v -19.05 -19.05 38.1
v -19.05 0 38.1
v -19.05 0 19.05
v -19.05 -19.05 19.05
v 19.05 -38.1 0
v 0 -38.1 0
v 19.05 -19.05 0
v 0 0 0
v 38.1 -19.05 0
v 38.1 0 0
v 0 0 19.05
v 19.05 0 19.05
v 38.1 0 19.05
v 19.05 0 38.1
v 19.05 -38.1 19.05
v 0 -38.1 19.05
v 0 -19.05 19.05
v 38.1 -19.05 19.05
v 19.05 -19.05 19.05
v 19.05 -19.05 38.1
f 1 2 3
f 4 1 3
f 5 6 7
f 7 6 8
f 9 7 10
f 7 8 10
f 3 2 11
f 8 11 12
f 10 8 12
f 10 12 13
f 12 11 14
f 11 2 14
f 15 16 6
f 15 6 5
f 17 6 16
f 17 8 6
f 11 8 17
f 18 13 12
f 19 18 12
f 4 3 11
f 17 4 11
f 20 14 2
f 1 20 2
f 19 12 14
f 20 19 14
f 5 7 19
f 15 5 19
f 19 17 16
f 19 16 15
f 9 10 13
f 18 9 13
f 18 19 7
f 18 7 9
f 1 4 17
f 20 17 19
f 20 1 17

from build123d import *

# Parameters (mm, degrees)
F1_DEPTH = 19.05
F2_W     = 19.05
F2_H     = 19.05
F3_DEPTH = 19.05


with BuildPart() as f1:
    # F0 (on Front) → F1 (new body)
    with BuildSketch(Plane.XZ):
        Polygon((0, 19.05), (0, 0), (38.1, 0), (38.1, 19.05), (19.05, 19.05), (19.05, 38.1), (-19.05, 38.1), (-19.05, 19.05), align=None)
    extrude(amount=F1_DEPTH)

    # F2 (on face) → F3 (join)
    with BuildSketch(Plane.XZ.offset(19.05)):
        with Locations((9.525, 9.525)):
            Rectangle(F2_W, F2_H)
    extrude(amount=F3_DEPTH)


solid = f1.part
